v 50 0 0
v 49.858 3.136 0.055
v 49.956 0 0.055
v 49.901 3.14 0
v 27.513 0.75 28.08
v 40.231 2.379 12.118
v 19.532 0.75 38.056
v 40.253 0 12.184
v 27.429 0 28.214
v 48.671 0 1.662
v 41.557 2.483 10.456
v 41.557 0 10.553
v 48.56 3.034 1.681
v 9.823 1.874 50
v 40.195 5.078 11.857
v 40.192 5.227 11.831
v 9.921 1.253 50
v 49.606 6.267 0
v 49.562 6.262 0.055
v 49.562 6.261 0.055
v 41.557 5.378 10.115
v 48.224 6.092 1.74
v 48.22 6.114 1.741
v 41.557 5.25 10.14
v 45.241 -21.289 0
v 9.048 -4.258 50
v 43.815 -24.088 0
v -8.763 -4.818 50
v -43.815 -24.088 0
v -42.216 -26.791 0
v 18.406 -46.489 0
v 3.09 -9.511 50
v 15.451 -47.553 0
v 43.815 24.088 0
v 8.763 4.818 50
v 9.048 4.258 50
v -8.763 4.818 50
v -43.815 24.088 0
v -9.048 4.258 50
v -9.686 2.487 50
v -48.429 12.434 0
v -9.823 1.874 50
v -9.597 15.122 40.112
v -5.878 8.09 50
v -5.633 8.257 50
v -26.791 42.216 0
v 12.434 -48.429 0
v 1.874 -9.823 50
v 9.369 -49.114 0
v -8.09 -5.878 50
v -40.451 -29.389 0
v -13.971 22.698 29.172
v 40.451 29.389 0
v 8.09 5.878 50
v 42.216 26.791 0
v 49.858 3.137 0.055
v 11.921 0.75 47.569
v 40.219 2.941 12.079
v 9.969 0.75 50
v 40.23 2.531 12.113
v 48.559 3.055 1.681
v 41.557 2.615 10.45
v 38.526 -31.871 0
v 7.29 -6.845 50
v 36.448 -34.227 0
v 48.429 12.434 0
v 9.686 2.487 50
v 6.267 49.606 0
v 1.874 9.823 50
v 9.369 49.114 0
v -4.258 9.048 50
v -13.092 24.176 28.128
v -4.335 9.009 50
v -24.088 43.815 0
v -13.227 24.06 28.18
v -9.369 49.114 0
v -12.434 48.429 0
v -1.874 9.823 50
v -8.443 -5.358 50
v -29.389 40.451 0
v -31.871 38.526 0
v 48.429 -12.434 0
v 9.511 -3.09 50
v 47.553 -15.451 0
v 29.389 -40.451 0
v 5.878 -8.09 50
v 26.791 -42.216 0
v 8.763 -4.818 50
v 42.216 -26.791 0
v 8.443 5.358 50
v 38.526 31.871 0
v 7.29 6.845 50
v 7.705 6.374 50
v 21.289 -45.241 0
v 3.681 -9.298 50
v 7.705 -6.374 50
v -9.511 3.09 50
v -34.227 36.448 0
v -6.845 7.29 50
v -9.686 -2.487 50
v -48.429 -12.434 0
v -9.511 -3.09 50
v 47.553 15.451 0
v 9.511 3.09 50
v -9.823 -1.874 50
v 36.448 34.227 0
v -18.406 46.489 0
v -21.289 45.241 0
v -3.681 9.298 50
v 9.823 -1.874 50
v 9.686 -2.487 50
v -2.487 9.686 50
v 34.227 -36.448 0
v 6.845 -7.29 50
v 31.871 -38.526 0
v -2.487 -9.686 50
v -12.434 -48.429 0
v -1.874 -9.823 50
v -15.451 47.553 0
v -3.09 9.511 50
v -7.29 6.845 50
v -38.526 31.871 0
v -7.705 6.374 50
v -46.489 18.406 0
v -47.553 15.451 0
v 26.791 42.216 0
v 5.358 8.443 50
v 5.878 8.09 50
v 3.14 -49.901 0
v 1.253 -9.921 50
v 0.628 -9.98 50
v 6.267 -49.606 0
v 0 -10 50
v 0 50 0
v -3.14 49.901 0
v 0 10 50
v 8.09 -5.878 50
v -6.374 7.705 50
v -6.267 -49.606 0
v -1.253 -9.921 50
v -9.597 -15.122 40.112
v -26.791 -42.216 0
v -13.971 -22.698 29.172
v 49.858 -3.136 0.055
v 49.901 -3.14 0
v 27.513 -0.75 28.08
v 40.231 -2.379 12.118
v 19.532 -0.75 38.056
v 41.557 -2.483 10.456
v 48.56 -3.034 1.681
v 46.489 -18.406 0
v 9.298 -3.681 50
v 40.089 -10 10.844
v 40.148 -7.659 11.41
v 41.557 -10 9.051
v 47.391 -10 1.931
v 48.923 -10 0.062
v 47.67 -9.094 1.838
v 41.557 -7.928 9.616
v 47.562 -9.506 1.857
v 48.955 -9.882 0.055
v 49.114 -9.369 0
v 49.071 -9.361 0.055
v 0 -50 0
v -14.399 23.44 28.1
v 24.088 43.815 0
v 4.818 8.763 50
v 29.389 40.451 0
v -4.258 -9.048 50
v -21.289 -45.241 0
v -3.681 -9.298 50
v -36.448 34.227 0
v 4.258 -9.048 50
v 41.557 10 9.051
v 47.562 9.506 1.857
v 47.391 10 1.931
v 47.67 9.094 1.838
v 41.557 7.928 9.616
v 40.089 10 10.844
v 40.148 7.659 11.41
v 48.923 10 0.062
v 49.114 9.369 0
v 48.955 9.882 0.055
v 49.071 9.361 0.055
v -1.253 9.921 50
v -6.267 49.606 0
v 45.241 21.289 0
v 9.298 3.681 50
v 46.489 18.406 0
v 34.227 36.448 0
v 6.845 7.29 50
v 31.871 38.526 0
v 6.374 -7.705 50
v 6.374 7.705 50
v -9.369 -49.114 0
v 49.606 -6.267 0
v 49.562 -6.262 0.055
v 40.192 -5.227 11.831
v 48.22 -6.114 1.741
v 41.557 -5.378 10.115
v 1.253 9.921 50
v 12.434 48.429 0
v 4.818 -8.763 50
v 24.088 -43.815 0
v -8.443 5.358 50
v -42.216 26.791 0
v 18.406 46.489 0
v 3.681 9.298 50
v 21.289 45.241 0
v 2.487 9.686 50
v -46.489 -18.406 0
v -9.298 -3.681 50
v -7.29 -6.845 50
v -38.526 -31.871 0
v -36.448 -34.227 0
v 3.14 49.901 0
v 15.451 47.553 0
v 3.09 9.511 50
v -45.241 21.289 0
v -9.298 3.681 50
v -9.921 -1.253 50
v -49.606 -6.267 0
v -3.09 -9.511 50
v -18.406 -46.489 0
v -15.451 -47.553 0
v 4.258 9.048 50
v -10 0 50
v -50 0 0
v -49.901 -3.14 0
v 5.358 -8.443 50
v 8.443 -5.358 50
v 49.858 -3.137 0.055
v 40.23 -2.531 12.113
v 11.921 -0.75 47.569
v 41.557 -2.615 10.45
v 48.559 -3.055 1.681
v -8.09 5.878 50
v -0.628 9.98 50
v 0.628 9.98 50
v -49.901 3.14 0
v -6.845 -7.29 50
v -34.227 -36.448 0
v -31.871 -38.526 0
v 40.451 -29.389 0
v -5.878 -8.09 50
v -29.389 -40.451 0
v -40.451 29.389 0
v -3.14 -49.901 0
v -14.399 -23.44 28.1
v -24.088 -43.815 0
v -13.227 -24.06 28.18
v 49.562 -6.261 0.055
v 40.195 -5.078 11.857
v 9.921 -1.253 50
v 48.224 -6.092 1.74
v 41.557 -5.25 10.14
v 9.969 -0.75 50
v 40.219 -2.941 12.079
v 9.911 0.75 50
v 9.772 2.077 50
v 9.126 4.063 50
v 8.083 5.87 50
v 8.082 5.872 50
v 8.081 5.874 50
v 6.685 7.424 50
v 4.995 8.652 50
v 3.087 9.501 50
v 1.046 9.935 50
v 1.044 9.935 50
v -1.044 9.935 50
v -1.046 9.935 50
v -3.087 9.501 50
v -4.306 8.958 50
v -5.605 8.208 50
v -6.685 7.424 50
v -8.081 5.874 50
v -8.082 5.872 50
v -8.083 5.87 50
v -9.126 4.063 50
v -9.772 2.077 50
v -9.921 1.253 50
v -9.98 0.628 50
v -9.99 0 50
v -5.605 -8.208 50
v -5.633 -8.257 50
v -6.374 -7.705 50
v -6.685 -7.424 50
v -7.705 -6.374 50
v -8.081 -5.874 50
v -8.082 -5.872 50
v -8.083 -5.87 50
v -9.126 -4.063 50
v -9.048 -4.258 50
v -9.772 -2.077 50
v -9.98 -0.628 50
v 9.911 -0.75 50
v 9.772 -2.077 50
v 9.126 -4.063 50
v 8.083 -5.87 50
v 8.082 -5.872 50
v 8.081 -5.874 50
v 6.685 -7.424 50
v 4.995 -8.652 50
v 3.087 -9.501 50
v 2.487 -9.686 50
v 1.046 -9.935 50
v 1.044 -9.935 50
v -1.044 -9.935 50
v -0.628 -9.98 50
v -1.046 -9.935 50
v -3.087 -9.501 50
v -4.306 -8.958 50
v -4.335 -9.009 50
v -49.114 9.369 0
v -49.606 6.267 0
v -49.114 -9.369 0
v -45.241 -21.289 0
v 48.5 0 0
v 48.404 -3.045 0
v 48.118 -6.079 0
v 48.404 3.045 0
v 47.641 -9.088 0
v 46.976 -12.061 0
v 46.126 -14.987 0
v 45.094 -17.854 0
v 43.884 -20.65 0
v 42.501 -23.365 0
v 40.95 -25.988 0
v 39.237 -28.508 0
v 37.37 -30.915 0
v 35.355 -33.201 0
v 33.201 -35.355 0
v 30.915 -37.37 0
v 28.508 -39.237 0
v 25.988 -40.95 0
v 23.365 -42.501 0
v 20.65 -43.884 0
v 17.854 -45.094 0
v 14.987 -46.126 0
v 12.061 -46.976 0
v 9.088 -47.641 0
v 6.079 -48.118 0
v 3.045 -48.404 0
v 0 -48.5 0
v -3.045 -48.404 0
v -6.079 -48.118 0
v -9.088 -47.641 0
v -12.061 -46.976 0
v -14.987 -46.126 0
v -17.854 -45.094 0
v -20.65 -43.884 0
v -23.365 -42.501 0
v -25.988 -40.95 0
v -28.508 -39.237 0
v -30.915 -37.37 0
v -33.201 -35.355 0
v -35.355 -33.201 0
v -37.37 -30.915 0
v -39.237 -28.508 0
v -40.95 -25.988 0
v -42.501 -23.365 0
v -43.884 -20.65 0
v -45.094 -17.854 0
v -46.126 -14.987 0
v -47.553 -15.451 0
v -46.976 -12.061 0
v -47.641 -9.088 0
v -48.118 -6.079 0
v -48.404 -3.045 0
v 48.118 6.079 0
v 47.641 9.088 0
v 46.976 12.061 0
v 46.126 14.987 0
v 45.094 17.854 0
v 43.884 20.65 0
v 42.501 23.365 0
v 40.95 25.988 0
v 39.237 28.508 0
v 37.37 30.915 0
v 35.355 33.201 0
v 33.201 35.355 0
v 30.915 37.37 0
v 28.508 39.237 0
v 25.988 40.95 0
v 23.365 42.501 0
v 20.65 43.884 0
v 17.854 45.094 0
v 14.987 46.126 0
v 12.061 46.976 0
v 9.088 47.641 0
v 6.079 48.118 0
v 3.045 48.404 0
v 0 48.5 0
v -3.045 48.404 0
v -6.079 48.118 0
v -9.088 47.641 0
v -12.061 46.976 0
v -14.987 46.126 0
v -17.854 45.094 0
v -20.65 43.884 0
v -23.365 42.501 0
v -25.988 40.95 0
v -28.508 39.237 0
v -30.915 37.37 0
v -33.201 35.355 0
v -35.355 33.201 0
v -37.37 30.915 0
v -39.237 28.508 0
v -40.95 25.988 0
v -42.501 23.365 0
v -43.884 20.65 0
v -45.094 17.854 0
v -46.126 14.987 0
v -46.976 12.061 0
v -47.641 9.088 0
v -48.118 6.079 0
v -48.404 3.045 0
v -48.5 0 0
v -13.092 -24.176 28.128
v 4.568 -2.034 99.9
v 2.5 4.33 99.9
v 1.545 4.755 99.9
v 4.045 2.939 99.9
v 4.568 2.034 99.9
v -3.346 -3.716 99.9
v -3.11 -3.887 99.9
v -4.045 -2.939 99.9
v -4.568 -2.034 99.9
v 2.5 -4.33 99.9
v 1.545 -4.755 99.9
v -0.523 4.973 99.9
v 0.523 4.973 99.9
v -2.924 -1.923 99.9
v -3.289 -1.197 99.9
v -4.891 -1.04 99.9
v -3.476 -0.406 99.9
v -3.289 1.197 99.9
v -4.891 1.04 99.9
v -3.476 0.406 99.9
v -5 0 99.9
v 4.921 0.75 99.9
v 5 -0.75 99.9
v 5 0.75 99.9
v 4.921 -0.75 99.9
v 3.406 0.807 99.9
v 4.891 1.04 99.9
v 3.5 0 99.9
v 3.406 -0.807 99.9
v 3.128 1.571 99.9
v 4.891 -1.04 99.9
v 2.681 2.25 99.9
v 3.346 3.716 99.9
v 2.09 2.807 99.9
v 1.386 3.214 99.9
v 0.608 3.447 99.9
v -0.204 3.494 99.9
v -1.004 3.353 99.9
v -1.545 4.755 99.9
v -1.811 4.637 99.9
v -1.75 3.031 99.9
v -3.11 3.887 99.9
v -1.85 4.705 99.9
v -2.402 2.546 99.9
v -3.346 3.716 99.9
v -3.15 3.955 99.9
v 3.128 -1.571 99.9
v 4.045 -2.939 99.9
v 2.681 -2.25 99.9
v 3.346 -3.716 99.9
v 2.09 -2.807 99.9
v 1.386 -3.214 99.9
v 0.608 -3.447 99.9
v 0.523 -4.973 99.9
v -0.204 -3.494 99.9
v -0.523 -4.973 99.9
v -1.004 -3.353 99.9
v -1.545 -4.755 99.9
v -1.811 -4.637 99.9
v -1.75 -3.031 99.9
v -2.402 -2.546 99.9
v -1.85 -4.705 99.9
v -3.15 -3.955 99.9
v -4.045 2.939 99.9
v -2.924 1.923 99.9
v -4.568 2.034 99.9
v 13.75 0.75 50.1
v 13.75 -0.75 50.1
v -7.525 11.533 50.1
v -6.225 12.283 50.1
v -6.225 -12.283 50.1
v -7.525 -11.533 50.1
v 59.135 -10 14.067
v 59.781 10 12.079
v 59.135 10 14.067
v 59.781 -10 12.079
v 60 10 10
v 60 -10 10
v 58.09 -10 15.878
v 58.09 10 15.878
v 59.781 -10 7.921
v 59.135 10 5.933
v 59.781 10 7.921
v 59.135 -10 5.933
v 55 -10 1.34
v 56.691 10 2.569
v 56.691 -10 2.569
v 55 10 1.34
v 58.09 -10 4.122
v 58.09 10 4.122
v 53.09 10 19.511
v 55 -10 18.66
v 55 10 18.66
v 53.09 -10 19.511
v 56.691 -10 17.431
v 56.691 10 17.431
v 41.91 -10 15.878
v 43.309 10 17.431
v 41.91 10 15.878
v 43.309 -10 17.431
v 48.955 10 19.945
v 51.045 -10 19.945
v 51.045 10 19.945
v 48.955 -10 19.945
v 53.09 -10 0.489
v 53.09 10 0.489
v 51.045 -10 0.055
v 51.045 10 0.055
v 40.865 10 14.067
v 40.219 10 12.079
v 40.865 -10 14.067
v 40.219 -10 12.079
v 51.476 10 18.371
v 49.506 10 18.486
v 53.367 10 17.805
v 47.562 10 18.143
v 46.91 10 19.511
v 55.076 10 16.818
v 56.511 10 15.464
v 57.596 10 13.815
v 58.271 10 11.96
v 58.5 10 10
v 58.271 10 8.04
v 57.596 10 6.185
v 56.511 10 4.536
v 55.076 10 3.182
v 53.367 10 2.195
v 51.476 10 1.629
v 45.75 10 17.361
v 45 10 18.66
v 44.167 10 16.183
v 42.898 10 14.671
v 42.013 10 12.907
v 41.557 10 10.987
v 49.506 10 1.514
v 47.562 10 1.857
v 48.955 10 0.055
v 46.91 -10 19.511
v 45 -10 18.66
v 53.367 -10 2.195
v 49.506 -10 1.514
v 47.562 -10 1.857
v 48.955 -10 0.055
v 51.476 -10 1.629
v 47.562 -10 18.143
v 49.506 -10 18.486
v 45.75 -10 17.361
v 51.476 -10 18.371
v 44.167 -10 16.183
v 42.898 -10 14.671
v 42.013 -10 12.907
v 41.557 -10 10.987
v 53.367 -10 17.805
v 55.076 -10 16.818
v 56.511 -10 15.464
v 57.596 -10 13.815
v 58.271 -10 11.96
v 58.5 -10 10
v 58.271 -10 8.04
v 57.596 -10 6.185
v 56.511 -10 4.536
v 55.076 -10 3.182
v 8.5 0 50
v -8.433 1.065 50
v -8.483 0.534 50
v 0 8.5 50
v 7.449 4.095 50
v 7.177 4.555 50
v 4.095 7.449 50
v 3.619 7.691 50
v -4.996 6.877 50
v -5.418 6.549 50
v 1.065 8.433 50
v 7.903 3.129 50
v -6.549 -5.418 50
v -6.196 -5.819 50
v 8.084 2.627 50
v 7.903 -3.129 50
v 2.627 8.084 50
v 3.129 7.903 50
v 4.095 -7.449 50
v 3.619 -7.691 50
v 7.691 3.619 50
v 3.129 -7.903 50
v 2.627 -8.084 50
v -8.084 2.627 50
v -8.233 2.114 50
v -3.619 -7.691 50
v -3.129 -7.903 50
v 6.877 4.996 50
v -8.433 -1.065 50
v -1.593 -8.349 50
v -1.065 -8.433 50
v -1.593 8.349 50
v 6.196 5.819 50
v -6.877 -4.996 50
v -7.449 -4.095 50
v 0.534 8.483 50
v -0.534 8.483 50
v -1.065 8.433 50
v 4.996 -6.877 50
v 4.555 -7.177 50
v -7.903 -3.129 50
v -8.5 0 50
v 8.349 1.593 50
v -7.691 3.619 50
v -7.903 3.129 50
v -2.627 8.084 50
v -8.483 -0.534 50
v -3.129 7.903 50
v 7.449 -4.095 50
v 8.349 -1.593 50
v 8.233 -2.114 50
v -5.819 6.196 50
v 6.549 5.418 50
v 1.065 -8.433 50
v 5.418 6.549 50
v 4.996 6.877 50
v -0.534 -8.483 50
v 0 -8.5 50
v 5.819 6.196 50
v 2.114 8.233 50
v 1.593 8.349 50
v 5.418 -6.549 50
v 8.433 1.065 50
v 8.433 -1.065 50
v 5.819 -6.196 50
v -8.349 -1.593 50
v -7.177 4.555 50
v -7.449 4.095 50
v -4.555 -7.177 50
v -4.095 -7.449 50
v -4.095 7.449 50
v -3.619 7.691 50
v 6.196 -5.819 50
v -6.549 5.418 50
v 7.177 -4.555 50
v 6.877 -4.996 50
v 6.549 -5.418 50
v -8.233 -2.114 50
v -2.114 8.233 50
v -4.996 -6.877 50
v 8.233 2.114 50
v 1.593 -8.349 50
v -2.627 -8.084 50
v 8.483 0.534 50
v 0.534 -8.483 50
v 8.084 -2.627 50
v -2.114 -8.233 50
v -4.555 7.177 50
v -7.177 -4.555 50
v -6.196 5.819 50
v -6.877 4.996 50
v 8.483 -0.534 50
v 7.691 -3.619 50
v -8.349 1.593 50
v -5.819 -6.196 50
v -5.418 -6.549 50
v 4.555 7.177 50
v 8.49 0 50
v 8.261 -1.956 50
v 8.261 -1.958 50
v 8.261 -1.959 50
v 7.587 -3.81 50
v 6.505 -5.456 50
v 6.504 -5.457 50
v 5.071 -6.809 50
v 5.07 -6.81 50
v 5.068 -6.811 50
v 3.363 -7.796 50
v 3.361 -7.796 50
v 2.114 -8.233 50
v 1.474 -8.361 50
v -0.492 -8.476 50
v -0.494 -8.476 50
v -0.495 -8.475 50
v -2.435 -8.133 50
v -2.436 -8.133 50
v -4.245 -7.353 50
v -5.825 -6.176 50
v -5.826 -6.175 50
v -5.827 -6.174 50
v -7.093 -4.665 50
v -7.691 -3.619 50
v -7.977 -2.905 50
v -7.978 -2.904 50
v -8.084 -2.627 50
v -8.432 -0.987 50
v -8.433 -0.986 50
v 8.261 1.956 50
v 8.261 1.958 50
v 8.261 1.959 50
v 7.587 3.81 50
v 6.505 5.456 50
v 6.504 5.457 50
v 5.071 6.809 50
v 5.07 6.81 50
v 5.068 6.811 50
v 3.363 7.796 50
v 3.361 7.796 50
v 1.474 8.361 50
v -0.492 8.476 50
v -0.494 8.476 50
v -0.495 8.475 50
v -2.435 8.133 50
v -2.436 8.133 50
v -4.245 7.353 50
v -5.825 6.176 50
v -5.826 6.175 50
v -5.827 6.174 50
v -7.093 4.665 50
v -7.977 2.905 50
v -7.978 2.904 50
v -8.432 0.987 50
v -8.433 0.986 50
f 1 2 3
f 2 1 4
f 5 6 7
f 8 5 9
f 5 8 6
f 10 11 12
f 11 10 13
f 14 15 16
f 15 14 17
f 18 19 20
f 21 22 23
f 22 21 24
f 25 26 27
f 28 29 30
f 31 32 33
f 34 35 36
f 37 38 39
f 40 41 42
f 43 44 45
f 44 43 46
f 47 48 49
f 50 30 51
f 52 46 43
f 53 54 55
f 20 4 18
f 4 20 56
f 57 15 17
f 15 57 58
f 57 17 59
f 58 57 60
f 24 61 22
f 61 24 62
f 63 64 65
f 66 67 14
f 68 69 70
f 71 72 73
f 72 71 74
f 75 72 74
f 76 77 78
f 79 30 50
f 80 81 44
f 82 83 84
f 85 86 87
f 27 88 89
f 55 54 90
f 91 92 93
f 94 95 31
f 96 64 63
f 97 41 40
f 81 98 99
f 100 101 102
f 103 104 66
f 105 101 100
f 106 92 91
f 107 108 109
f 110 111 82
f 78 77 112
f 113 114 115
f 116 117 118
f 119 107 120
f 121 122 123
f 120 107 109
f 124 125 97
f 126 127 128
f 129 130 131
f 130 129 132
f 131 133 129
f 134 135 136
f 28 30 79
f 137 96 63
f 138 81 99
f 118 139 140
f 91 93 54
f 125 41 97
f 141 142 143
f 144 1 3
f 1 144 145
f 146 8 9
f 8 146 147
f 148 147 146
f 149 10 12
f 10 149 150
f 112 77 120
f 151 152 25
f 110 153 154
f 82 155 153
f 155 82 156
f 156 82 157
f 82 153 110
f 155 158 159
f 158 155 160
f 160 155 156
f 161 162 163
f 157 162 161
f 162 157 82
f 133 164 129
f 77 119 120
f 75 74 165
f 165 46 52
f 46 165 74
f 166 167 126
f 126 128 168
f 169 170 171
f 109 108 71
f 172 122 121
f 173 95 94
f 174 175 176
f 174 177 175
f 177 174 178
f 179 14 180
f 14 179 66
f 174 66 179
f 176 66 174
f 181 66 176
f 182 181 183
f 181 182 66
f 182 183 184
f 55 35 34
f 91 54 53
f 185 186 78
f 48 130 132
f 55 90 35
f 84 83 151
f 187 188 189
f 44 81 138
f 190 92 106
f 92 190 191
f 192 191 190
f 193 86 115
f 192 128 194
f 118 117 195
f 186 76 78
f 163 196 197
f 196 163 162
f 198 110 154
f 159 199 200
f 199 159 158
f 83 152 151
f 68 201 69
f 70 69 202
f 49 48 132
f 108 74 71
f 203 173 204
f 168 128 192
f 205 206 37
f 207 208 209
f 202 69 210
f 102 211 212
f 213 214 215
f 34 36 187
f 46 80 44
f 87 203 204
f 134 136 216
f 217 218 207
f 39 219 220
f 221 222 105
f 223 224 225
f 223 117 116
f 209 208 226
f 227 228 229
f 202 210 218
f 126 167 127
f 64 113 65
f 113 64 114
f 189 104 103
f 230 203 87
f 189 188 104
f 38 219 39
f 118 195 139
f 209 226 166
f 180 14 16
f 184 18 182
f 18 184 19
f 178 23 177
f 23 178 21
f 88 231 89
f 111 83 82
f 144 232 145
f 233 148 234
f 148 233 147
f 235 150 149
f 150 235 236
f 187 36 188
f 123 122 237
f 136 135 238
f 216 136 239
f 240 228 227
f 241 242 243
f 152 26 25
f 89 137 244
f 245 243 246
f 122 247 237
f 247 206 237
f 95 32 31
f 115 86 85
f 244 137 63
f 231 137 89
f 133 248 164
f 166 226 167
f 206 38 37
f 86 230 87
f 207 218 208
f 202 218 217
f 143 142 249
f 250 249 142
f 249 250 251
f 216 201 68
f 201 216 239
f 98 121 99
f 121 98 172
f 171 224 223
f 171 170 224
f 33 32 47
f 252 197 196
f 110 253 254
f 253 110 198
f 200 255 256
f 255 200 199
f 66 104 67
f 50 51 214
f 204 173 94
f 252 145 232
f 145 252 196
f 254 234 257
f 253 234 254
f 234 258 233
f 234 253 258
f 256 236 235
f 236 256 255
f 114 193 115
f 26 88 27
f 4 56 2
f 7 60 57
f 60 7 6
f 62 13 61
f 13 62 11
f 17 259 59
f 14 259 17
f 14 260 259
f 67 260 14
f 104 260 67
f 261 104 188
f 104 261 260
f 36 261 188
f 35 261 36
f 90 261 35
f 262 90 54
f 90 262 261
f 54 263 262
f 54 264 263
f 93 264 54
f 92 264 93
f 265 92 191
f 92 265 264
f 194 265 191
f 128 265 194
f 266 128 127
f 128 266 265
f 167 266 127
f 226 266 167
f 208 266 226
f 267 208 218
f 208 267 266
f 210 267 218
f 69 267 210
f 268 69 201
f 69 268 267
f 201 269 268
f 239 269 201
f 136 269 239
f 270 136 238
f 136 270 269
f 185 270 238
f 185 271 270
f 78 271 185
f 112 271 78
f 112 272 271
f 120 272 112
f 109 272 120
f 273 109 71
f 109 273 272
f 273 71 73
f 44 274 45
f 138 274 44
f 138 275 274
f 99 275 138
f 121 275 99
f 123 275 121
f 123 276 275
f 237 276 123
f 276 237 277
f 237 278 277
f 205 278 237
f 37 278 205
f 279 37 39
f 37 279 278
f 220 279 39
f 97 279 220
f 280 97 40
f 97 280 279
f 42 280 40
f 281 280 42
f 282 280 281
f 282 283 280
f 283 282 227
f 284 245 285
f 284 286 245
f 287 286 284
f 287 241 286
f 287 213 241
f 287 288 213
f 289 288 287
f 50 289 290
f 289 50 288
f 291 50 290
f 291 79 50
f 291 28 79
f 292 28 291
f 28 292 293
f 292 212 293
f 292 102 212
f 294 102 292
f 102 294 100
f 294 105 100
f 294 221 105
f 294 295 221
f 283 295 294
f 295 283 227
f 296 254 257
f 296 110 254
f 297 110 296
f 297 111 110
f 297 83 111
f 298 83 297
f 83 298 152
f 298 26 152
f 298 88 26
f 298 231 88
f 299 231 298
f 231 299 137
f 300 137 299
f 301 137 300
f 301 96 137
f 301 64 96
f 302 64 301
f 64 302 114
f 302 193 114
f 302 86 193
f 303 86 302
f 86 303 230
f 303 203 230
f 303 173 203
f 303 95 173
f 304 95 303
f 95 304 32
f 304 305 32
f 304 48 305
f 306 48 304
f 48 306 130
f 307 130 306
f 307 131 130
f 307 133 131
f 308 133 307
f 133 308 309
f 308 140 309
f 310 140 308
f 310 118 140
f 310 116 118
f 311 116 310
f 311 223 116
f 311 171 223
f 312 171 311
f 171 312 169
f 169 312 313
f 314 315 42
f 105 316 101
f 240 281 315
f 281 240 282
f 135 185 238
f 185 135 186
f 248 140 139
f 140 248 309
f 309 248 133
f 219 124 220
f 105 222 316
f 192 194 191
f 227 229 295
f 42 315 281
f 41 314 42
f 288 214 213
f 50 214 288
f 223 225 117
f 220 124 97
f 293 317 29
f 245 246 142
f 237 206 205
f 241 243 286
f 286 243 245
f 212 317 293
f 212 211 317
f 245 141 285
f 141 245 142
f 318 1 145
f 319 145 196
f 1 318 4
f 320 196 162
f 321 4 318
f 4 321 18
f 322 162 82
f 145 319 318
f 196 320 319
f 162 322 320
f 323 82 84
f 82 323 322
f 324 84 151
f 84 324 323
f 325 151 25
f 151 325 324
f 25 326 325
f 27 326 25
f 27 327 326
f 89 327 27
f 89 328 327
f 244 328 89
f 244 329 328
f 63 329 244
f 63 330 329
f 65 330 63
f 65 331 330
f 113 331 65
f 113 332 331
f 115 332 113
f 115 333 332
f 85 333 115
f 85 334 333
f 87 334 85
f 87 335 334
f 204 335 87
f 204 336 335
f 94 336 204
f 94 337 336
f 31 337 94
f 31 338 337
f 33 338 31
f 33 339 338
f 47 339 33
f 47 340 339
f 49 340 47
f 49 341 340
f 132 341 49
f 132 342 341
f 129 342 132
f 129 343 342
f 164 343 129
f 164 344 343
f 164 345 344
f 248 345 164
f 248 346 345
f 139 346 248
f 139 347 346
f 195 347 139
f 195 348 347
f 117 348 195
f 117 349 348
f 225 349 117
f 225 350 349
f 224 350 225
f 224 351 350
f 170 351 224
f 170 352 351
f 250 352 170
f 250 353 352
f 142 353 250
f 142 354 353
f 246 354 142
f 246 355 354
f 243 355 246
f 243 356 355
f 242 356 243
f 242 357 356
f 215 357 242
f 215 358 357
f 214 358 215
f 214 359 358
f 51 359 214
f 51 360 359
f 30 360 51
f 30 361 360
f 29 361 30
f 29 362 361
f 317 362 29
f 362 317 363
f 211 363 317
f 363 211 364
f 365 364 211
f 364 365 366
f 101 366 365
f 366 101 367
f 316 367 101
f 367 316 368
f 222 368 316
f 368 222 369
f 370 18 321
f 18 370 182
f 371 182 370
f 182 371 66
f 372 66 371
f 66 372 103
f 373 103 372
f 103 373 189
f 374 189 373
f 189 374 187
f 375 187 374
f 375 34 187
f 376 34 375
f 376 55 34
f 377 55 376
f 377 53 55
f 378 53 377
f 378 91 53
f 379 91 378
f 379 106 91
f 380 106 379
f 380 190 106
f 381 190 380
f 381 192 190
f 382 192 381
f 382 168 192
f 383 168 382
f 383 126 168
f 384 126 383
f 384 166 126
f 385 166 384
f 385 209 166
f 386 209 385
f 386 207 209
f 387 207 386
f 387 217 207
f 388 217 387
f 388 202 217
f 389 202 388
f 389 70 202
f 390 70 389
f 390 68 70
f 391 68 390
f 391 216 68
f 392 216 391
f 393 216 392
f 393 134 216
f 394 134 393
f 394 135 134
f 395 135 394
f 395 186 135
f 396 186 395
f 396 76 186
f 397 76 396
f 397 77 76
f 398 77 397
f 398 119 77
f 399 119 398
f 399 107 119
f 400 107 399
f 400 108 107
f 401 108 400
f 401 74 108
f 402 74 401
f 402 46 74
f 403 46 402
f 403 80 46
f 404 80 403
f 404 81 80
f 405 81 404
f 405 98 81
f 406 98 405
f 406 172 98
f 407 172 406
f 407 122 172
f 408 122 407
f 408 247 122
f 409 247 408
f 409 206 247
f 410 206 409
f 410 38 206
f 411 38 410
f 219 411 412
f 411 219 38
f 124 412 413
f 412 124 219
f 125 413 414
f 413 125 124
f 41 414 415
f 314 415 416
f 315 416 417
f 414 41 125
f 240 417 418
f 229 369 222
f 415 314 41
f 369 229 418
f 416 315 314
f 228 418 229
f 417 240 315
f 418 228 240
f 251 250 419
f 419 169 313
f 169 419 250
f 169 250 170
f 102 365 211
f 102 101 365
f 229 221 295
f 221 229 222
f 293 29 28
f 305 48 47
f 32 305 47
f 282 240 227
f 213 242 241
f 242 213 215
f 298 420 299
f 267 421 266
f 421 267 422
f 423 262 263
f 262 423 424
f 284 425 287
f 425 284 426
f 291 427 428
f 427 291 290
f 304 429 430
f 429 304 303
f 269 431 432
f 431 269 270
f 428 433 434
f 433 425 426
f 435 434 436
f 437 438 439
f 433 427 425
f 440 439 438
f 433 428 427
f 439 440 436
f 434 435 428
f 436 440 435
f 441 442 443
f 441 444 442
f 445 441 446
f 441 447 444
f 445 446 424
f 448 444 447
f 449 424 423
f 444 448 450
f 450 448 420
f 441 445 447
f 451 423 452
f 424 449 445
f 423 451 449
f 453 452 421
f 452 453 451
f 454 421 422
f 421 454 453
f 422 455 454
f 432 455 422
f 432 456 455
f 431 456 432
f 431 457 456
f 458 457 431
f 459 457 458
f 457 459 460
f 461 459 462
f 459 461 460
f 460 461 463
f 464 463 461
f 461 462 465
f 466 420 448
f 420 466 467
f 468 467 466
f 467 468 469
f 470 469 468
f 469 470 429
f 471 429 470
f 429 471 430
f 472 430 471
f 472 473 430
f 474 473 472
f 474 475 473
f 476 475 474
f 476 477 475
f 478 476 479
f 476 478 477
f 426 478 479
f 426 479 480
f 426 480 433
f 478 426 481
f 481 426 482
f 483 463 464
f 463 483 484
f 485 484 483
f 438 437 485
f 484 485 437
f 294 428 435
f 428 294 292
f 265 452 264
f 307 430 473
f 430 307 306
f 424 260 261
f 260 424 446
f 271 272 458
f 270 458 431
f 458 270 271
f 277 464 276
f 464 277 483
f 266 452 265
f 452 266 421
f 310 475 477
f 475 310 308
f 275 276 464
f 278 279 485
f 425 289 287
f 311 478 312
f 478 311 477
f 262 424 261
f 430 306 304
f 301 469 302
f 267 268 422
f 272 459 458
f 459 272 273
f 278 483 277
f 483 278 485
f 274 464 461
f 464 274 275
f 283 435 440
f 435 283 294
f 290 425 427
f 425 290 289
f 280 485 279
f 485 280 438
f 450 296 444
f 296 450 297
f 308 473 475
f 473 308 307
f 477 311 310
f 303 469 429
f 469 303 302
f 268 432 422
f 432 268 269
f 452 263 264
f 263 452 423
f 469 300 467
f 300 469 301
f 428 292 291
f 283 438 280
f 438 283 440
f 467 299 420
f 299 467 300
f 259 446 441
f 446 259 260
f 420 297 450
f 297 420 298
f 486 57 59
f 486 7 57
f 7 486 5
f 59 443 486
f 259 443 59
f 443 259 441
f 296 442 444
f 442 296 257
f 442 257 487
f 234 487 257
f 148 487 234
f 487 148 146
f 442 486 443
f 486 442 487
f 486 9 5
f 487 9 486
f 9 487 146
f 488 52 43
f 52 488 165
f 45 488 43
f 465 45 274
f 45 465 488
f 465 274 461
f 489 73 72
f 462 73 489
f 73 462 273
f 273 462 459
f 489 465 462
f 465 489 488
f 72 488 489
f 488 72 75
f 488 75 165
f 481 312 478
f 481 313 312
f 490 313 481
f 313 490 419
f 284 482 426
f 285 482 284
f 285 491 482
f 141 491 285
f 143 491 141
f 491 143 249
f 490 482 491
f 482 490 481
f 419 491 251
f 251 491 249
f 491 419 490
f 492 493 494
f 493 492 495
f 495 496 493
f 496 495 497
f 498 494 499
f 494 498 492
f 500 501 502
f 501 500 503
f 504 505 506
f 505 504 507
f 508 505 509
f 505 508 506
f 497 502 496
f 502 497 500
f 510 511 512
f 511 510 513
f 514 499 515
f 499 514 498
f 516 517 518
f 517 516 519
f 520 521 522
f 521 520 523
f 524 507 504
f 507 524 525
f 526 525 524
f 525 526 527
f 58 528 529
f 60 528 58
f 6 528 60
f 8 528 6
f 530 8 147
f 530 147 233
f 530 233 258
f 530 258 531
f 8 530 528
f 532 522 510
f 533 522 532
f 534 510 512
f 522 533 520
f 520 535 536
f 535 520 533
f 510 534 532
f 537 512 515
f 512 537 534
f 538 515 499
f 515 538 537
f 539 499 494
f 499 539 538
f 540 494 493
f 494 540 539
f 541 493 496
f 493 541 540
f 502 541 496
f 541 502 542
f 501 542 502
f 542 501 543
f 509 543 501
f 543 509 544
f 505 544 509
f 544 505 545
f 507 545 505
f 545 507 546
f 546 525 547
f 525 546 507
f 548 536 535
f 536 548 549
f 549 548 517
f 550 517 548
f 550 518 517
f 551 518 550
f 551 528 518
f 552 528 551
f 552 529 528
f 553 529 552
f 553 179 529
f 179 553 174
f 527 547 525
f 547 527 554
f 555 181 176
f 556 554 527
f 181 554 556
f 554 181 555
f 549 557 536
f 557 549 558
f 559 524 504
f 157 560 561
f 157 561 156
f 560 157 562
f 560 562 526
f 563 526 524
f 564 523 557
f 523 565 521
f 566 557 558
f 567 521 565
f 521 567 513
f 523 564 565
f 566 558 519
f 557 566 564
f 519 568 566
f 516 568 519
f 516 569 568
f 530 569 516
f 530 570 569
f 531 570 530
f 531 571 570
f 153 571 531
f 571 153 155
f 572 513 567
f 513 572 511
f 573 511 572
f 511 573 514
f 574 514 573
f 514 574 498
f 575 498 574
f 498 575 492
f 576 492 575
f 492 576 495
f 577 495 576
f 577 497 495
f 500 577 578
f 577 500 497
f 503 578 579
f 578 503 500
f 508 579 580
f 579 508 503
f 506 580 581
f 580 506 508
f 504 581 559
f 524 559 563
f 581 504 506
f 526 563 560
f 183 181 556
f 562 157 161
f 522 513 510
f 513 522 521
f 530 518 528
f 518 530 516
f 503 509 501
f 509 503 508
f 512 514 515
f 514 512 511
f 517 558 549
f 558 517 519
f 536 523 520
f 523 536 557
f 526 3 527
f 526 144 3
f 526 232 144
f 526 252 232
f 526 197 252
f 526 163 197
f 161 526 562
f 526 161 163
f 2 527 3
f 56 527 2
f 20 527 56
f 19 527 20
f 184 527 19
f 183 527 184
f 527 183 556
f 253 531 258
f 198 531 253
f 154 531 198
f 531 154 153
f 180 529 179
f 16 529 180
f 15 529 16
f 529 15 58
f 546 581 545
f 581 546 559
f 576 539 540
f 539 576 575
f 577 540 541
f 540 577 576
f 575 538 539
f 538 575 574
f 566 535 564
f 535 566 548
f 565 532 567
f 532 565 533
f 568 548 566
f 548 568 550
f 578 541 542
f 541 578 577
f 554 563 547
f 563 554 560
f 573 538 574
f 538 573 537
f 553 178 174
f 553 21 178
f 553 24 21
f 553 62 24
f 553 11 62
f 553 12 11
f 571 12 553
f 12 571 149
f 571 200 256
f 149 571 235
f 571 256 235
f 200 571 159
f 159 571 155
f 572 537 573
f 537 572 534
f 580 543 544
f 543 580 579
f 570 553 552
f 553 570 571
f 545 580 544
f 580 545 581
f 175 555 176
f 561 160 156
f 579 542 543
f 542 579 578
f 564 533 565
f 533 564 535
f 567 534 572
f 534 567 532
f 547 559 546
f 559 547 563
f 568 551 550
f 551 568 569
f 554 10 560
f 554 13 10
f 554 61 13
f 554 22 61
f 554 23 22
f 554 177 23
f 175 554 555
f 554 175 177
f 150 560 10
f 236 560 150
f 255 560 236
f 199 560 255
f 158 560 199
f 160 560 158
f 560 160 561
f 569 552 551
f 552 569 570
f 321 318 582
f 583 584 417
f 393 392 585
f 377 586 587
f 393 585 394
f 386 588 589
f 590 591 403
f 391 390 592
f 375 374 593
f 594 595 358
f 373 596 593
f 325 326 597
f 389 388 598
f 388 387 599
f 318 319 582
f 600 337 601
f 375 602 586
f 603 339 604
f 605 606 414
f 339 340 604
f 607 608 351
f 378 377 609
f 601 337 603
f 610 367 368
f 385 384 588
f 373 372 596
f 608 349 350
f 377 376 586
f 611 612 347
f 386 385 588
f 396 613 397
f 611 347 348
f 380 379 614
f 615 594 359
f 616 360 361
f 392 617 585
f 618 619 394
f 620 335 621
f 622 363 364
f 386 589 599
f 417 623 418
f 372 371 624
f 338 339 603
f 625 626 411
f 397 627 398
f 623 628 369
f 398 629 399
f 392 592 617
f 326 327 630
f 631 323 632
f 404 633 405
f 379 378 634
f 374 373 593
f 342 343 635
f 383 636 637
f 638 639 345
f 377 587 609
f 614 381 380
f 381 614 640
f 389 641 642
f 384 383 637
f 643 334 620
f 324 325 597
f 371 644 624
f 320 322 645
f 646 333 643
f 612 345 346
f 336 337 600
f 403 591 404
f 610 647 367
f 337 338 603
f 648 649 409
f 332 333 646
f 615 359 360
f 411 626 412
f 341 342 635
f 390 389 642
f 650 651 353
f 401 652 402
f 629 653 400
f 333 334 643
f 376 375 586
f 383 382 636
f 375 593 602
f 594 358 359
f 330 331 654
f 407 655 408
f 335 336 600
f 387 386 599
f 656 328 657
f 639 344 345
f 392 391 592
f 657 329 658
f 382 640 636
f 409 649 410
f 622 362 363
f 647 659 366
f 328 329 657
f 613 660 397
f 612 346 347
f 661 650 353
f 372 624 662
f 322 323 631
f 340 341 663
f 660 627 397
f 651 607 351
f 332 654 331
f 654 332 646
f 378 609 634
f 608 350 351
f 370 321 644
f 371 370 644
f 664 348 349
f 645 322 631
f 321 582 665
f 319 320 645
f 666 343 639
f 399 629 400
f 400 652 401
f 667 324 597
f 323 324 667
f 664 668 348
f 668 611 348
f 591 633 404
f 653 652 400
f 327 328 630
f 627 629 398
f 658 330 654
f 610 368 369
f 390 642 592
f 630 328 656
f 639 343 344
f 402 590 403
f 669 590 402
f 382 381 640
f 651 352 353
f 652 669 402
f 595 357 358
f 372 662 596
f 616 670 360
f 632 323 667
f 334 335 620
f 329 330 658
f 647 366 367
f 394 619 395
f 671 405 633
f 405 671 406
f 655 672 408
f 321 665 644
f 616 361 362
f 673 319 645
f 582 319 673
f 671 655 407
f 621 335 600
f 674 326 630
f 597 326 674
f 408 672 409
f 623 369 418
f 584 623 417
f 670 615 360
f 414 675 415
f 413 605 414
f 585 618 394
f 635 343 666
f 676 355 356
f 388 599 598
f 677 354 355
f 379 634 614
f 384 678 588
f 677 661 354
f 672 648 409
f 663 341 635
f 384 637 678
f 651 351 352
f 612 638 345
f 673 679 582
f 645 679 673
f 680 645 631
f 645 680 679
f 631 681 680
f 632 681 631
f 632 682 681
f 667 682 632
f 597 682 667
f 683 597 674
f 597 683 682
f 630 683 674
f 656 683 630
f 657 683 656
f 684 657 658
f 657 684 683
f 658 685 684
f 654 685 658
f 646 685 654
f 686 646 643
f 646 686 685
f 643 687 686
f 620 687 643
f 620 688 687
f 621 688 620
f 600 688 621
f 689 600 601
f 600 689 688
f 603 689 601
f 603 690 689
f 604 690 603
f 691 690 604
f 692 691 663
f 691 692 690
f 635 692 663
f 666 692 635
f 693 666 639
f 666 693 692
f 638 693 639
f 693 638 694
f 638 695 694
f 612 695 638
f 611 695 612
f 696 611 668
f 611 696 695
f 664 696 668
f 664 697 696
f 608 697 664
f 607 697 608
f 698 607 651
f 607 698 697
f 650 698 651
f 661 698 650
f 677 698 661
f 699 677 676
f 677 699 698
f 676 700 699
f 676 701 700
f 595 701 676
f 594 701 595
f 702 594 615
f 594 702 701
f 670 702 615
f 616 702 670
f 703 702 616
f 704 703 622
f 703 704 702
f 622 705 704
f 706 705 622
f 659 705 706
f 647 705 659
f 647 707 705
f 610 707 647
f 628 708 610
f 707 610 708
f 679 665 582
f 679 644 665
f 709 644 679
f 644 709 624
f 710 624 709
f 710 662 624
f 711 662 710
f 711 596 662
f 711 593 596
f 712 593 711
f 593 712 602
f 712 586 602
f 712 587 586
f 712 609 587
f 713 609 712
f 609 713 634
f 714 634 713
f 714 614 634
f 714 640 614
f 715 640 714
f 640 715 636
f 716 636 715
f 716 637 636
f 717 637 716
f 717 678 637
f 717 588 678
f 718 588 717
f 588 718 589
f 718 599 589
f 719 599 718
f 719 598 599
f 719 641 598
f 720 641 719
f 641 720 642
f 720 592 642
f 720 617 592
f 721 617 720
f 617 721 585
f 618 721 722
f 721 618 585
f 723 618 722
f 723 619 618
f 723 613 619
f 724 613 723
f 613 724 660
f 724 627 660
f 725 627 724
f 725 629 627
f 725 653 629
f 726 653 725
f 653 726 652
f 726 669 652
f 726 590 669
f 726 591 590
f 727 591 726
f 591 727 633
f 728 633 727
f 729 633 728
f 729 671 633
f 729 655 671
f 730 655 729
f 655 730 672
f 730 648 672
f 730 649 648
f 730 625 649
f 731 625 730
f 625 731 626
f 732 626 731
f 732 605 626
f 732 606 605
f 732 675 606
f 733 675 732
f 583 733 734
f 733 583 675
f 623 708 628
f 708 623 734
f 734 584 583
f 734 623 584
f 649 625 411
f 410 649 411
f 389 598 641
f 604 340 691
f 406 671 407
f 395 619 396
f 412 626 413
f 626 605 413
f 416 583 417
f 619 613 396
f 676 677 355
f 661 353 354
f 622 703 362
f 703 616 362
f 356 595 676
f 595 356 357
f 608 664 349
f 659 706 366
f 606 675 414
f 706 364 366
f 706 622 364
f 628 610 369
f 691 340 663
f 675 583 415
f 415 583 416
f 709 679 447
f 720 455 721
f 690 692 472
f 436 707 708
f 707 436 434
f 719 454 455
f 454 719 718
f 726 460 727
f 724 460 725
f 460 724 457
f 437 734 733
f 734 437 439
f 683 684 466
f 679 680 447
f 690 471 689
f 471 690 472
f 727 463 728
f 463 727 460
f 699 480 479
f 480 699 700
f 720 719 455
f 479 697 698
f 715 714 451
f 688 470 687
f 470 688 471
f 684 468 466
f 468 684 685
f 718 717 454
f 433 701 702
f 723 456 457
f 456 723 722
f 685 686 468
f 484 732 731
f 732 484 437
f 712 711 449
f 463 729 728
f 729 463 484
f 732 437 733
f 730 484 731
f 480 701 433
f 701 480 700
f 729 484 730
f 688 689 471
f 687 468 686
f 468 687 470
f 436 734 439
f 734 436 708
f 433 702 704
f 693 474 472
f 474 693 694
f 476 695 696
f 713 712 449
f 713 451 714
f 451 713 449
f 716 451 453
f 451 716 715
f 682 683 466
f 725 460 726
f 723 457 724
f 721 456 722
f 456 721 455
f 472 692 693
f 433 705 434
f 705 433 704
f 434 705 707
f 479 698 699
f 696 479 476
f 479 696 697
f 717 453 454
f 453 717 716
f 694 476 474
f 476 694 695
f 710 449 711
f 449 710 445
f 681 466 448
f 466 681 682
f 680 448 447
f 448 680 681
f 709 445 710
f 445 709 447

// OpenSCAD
top_diameter    = 100; // [40:1:500]
middle_diameter =  20; // [10:1:60]
bottom_diameter =  10; // [5:1:40]
top_rim         =   0; // [0:1:50]

wall = 1.5; // [0.5:0.05:4]
create_ventilation = "true"; // [true, false]
create_handle = "true"; // [true, false]

all();

module all()
{
    difference()
    {
        union()
        {
            funnel();
            if(create_ventilation == "true") ventilation();
            if(create_handle == "true") handle();
        }
        funnel(wall);
        
    }
}

module funnel(wall=0)
{
    cylinder(d=top_diameter-2*wall, h=top_rim, $fn=top_diameter);
    translate([0,0,top_rim])
        cylinder(d1=top_diameter-2*wall, d2=middle_diameter-2*wall, top_diameter/2, $fn=top_diameter);
    translate([0,0,top_diameter/2+top_rim-0.1]) 
        cylinder(d1=middle_diameter-2*wall, d2=bottom_diameter-2*wall, top_diameter/2);
}

module handle()
{
    translate([x_handle(),middle_diameter/2,middle_diameter/2]) rotate([90,0,0]) 
        difference()
        {
            cylinder(d=middle_diameter, h=middle_diameter);
            cylinder(d=middle_diameter-2*wall, h=middle_diameter);
        }
}

function x_handle() = (top_rim>5) ? top_diameter/2+middle_diameter/4 : top_diameter/2;


module ventilation()
{
    for(alpha=[0,120,240])
    {
        rotate([0,0,alpha])
        union()
        {
            hull()
            {
                // bottom of funnel
                translate([0,-wall/2,top_diameter+top_rim-0.2]) 
                    cube([bottom_diameter/2,wall,0.1]);
                // middle of funnel
                translate([0,-wall/2,top_diameter/2+top_rim]) 
                    cube([middle_diameter/2+2.5*wall,wall,0.1]);
            }
            hull()
            {
                // middle of funnel
                translate([0,-wall/2,top_diameter/2+top_rim]) 
                    cube([middle_diameter/2+2.5*wall,wall,0.1]);
                // top of funnel
                translate([0,-wall/2,top_rim]) 
                    cube([top_diameter/2*0.9,wall,0.1]);
            }
        }
    }
}
